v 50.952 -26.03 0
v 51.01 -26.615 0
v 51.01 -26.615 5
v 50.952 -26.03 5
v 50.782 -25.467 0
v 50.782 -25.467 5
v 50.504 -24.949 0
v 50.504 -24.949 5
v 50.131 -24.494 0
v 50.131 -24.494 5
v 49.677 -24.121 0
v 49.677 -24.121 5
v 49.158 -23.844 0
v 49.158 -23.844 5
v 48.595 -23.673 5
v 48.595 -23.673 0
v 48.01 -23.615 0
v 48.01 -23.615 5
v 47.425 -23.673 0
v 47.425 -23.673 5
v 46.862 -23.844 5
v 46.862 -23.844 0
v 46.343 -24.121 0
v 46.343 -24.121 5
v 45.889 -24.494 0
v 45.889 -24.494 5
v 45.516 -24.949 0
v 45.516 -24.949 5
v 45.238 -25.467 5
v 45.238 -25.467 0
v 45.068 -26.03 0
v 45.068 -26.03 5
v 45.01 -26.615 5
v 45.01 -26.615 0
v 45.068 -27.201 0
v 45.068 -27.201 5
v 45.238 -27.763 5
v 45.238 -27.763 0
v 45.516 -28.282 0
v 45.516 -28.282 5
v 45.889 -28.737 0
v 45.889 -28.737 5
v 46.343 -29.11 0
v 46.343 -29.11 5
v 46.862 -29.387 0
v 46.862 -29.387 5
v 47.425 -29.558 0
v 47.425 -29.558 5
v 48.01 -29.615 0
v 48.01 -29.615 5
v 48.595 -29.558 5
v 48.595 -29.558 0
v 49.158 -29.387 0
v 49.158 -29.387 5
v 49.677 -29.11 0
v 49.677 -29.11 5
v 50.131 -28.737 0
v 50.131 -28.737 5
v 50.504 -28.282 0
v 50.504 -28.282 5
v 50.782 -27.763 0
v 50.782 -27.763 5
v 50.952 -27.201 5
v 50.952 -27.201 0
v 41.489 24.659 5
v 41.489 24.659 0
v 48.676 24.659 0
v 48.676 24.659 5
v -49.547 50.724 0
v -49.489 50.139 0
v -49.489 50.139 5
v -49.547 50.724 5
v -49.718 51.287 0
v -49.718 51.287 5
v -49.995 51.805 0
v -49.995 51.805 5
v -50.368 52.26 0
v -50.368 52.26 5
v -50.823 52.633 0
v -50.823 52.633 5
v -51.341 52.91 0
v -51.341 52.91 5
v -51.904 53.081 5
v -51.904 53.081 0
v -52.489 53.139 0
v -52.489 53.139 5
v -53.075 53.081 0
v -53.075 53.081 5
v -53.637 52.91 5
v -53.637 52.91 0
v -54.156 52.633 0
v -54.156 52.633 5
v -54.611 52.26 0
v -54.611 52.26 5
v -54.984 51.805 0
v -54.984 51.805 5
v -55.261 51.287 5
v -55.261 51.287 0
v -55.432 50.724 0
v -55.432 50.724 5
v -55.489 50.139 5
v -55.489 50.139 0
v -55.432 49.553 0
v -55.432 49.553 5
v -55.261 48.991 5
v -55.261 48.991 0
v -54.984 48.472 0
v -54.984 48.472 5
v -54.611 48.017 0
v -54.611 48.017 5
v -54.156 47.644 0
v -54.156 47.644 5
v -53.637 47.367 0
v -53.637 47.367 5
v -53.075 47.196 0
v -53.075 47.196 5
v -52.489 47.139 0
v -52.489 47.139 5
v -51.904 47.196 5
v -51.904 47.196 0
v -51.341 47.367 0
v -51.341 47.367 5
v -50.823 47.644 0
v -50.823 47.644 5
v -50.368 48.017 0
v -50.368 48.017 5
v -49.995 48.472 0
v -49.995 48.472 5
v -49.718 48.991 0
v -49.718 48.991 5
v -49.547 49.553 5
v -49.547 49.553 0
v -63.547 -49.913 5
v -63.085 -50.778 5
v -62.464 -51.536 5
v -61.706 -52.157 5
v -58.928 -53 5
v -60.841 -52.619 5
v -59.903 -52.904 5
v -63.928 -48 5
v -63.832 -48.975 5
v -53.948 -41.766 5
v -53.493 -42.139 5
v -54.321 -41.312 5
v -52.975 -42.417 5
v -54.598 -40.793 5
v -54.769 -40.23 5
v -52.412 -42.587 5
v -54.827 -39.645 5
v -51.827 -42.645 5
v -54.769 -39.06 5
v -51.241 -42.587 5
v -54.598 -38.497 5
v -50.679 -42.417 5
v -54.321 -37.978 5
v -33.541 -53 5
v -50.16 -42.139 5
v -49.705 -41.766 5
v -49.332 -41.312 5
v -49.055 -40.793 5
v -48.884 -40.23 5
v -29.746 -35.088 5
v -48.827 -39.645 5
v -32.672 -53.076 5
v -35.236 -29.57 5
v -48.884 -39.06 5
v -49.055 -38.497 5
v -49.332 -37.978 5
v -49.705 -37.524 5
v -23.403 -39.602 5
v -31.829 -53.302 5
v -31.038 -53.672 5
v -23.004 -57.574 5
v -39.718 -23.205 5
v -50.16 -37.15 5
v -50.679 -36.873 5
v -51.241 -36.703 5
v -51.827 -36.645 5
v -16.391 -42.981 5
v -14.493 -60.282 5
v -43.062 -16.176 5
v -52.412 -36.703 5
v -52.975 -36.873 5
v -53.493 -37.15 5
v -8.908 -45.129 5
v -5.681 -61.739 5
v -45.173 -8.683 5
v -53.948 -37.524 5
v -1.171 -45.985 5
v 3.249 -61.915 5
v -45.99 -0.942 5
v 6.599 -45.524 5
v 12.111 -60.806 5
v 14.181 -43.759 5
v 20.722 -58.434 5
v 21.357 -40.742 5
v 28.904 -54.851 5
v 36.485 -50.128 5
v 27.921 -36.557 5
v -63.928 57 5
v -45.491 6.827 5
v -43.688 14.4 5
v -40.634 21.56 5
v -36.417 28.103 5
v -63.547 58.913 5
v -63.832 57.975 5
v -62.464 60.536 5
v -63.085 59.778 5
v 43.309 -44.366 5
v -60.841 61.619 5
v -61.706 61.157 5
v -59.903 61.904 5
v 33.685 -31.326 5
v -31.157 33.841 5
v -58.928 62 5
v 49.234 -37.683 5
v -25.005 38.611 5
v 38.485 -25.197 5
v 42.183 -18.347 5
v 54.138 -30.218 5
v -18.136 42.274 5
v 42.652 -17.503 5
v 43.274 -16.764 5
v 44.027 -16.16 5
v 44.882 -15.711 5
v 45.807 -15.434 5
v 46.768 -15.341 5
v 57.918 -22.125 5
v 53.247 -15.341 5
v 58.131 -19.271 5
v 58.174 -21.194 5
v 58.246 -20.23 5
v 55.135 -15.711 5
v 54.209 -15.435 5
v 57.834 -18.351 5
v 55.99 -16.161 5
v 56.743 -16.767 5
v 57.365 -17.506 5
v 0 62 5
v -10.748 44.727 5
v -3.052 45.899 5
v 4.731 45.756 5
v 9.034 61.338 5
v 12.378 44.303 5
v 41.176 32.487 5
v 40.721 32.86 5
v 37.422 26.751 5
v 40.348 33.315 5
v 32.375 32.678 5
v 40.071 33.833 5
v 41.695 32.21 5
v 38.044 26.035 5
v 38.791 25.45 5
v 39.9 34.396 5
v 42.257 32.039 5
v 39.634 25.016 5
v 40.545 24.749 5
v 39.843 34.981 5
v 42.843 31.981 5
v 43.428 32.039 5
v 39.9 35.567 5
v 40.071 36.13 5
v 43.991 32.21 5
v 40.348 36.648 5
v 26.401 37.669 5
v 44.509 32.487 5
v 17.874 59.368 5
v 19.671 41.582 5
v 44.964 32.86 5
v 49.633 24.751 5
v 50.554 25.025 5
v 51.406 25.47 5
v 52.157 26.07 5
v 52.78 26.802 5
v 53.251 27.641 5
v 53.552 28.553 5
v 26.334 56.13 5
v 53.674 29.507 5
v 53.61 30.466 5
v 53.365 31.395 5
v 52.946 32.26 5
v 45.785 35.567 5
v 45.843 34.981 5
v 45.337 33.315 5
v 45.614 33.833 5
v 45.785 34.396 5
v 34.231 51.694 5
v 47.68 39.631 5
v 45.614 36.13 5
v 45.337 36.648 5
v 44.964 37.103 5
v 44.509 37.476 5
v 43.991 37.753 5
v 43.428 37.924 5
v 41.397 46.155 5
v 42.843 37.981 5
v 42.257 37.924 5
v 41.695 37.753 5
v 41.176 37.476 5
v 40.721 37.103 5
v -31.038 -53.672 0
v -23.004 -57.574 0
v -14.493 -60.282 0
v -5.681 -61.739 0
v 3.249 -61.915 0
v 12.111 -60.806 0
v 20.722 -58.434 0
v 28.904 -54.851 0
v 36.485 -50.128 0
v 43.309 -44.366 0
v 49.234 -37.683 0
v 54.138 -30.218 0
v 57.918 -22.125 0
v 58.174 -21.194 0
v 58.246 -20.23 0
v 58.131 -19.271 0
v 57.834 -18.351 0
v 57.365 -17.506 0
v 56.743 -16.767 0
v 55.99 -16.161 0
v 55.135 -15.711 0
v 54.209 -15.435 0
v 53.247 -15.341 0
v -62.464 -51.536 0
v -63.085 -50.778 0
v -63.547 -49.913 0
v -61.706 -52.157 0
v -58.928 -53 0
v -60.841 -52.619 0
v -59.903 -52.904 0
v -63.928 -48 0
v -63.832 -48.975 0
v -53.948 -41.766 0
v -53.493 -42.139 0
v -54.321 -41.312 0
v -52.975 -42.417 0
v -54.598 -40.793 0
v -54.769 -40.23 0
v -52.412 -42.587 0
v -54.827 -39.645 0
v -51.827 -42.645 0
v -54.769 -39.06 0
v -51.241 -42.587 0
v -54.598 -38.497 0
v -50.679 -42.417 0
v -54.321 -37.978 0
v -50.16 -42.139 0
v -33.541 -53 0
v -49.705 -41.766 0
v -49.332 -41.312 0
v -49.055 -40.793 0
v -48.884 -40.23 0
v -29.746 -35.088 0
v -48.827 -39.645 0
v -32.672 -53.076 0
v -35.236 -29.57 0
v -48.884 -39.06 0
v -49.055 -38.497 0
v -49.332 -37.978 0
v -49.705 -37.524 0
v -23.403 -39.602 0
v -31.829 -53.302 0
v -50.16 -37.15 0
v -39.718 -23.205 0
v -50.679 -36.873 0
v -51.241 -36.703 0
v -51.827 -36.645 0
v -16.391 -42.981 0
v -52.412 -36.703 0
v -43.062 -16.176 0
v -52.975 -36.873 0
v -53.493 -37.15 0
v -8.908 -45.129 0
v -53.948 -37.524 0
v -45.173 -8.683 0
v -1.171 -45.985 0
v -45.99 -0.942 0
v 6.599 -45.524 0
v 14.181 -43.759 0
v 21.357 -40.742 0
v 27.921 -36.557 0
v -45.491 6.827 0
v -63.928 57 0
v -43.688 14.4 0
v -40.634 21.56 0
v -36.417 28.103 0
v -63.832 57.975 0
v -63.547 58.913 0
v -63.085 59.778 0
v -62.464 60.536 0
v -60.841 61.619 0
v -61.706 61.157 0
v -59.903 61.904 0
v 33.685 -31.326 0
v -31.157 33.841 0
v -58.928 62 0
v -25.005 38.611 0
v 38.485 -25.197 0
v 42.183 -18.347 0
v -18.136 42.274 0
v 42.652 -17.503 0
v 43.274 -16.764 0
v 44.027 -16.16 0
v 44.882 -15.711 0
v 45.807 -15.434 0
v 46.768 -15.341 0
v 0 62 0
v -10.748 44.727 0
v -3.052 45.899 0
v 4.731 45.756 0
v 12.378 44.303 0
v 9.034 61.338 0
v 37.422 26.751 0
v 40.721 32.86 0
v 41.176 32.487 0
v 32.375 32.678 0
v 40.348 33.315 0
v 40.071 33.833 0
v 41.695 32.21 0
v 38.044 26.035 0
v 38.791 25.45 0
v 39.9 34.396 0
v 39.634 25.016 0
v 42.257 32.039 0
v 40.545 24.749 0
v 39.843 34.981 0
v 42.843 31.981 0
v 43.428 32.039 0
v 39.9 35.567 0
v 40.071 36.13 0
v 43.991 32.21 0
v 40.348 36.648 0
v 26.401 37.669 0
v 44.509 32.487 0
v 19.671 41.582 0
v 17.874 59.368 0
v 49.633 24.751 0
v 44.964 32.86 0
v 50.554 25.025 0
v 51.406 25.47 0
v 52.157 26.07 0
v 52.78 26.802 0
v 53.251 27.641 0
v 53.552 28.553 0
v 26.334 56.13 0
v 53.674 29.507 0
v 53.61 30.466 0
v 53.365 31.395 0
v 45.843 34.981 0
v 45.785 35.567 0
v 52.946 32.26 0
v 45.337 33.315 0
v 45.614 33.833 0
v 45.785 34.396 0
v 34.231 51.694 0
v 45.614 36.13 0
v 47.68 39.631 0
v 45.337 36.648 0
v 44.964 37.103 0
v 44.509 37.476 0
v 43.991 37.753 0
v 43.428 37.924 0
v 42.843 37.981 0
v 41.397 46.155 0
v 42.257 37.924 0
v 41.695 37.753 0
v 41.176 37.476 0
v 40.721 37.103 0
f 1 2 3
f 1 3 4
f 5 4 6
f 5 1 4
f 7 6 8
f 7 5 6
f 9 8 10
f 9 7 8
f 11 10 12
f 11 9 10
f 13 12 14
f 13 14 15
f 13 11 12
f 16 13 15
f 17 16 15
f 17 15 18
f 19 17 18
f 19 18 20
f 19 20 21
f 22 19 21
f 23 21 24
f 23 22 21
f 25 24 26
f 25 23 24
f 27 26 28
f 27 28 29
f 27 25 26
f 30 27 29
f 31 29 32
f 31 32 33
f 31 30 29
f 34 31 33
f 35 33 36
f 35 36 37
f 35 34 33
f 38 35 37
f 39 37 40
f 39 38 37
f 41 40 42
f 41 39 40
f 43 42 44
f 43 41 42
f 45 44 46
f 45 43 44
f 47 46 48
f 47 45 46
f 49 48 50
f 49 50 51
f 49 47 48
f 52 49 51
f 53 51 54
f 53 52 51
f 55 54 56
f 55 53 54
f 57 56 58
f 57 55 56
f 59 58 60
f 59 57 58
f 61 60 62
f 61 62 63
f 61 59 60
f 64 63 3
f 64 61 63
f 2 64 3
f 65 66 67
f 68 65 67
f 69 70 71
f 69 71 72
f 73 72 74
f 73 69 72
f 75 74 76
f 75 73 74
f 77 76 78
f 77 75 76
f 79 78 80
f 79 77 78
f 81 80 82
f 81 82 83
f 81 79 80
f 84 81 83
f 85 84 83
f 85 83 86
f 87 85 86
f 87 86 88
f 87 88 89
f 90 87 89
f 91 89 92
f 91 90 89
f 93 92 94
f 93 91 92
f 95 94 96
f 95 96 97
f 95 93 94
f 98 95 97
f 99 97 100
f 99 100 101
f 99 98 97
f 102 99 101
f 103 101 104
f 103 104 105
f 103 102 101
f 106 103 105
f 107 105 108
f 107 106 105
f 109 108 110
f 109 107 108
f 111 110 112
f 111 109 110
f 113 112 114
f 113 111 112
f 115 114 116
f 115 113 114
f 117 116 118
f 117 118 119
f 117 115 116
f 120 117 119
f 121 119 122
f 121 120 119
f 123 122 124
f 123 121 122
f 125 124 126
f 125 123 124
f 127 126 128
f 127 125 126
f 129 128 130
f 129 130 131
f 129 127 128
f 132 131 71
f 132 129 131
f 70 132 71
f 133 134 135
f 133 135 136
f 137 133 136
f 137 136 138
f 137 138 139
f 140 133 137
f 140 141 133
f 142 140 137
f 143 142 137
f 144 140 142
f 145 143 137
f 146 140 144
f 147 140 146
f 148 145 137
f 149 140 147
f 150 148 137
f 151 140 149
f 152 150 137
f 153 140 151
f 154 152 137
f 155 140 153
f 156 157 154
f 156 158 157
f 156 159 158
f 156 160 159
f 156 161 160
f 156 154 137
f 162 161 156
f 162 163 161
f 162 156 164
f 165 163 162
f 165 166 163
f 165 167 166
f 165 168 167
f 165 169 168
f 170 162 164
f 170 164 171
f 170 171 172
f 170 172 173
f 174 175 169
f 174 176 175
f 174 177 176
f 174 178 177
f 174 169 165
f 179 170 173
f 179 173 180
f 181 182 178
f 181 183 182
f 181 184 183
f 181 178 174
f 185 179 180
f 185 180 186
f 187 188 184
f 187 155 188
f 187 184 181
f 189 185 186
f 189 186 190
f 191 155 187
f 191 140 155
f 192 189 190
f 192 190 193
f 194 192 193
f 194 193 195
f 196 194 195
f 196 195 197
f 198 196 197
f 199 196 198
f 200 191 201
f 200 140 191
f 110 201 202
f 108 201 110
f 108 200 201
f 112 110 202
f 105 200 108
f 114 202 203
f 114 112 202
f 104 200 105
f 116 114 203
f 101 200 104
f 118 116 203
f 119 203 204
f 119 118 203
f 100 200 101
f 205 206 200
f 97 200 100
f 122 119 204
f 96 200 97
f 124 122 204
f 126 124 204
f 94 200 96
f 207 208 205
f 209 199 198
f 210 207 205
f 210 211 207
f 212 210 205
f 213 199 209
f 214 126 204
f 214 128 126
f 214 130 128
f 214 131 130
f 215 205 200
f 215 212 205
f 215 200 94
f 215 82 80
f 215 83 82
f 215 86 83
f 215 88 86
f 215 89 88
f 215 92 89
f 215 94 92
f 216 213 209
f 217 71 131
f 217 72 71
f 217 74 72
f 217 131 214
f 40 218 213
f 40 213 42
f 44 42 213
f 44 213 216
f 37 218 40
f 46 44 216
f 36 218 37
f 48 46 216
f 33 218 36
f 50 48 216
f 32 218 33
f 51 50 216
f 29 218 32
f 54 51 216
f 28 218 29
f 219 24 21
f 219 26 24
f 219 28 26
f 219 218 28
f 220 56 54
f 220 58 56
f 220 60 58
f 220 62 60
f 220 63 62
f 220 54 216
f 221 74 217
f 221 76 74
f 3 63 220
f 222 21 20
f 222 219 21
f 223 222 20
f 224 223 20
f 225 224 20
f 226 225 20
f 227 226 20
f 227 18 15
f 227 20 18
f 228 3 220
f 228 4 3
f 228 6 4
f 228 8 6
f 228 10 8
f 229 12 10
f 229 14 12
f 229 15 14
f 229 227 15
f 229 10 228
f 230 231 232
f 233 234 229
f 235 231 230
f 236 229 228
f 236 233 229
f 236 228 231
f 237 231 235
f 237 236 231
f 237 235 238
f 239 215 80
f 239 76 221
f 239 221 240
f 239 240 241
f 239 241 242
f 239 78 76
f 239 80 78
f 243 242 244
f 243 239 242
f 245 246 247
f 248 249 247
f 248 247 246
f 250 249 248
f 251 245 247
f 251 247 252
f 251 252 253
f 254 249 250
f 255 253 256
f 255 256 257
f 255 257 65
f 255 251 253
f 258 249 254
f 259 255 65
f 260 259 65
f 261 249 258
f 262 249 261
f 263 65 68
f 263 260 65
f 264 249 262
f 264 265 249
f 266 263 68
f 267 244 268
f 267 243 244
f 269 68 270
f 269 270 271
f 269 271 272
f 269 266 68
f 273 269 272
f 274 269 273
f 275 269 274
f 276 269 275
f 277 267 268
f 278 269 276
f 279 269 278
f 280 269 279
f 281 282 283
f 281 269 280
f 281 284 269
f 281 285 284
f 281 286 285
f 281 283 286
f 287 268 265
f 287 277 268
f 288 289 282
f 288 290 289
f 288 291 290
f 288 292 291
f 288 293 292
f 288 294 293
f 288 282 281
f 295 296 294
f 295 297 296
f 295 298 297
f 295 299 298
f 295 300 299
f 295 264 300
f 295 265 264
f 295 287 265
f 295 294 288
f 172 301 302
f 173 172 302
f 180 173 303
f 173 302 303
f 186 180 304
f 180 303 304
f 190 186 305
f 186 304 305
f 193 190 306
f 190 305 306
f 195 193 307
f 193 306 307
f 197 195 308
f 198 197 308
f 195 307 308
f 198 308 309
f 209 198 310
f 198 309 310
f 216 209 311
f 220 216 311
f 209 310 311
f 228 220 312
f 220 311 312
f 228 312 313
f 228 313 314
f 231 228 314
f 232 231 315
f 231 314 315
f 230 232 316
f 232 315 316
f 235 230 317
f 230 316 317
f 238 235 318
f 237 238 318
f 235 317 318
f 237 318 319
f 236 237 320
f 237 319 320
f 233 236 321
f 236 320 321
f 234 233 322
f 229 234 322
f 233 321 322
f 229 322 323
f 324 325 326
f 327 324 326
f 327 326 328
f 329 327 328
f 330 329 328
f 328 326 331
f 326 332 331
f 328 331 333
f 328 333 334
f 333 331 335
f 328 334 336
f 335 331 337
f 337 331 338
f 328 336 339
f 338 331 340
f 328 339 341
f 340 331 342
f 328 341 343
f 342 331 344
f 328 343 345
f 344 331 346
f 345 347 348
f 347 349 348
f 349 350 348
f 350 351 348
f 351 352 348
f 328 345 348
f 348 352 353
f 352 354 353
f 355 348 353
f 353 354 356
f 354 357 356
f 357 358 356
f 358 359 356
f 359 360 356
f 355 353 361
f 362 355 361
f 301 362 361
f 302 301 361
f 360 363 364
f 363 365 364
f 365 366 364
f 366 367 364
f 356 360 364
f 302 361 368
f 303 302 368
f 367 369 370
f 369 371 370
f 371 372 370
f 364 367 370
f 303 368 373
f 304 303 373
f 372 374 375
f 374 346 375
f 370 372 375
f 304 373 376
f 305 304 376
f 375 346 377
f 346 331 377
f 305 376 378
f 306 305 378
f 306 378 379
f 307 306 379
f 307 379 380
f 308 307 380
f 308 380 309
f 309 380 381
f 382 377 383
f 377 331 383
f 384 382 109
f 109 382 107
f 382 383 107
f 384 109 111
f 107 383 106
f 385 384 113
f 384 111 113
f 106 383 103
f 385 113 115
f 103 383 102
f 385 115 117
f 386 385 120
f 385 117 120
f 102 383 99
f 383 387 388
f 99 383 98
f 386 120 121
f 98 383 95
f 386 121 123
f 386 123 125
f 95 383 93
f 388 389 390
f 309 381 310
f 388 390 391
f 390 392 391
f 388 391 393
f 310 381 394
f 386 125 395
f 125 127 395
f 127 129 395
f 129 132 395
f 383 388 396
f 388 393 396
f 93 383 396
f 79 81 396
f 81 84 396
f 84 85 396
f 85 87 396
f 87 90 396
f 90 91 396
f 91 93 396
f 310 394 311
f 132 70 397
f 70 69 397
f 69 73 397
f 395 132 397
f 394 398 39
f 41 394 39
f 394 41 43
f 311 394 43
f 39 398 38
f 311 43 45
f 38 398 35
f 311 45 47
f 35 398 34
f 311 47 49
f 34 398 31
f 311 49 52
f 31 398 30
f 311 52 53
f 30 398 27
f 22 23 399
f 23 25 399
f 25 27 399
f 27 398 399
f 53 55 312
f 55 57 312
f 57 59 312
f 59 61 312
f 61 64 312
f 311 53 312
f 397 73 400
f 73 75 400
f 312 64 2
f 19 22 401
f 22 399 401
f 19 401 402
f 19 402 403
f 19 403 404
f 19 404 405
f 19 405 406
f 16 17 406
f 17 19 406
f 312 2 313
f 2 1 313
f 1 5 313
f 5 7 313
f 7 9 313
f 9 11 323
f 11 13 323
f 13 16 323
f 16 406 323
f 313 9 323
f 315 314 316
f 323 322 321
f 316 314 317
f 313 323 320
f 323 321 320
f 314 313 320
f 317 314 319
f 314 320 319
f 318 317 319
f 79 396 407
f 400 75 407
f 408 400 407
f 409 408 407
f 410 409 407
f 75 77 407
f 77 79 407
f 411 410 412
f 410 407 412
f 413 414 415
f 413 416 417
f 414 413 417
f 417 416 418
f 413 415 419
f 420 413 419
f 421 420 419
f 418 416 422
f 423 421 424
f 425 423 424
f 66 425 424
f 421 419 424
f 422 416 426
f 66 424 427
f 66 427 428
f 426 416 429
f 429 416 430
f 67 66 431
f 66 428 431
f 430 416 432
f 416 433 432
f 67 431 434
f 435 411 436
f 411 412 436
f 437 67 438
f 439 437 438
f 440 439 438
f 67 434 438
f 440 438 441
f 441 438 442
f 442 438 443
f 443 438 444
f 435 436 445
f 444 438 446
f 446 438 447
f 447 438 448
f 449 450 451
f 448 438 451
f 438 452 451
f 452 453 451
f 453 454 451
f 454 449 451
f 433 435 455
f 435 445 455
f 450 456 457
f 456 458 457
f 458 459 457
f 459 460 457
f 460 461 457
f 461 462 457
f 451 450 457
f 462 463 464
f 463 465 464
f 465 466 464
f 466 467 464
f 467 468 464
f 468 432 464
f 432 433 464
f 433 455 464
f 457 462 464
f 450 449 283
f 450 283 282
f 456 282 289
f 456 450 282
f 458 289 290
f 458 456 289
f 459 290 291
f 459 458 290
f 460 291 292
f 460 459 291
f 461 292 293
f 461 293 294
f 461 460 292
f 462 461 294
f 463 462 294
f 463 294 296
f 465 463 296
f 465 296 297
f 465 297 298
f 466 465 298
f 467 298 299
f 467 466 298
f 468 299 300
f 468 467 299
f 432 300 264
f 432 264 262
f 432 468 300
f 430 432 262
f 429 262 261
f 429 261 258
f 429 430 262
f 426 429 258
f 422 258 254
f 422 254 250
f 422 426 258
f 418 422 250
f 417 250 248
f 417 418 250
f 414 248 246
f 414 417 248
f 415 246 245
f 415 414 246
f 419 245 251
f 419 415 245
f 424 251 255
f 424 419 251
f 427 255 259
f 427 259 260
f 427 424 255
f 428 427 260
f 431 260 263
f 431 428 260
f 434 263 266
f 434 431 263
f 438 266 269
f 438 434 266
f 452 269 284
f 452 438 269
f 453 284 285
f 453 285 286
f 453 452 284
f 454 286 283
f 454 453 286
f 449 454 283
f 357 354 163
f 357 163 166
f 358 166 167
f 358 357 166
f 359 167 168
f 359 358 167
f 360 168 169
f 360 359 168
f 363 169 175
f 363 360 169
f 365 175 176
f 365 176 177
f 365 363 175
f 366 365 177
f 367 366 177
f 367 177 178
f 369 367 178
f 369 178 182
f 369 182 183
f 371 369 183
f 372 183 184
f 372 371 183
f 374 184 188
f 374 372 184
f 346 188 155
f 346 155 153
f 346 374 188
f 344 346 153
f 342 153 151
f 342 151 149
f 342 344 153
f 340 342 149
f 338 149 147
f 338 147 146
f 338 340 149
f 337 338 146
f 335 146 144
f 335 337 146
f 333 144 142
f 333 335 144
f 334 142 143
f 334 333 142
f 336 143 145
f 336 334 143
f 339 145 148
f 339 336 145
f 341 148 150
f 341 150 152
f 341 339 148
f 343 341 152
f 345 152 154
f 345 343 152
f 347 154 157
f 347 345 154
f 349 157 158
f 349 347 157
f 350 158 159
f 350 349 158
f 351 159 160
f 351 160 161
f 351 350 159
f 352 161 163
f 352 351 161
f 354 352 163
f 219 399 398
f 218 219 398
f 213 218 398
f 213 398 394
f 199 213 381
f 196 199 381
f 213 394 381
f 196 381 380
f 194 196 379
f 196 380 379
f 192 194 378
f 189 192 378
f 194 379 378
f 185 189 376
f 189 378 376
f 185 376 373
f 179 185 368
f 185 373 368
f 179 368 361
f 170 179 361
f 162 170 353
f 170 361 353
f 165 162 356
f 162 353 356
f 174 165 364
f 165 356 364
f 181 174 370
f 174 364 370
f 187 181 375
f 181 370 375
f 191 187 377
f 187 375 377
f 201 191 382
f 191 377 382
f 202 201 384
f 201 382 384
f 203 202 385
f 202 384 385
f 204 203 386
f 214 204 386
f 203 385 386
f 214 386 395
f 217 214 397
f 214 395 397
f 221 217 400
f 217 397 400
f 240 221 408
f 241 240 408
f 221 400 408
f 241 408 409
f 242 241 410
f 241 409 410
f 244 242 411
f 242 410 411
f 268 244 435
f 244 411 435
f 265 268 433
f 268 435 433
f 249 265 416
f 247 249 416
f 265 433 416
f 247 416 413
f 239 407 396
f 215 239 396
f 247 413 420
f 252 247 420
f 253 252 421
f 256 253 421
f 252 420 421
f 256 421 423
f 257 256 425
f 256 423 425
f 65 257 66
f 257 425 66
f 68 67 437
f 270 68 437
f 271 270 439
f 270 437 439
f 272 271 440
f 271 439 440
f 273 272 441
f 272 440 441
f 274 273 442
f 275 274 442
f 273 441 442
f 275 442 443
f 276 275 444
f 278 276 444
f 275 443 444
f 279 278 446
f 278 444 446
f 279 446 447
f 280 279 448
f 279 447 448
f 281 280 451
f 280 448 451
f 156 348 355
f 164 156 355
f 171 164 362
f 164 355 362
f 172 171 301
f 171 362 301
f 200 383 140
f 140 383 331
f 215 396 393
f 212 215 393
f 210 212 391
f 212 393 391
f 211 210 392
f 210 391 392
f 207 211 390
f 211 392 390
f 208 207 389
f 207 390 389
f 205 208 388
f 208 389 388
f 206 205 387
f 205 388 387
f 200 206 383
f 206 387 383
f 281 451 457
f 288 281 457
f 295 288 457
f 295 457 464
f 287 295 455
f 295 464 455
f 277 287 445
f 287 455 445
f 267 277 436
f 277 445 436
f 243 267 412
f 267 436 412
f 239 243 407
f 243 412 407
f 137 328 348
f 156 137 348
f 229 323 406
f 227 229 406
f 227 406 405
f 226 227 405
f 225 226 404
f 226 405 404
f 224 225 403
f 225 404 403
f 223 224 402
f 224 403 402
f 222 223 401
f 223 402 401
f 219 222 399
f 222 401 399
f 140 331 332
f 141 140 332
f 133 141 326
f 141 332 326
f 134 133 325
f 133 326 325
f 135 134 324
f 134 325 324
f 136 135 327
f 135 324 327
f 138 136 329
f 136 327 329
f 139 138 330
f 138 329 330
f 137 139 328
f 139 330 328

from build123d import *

# Parameters (mm, degrees)
F0_R     = 3
F1_DEPTH = 5


with BuildPart() as f1:
    # F0 (on Top) → F1 (new body)
    with BuildSketch(Plane.XY):
        with BuildLine():
            ThreePointArc((42.182817, -18.346934), (-45.745768, -4.82957), (37.42163, 26.751105))
            ThreePointArc((37.42163, 26.751105), (39.20213, 25.212564), (41.489198, 24.658834))
            Line((41.489198, 24.658834), (48.676006, 24.658834))
            ThreePointArc((48.676006, 24.658834), (53.035379, 27.210188), (52.945831, 32.260486))
            ThreePointArc((52.945831, 32.260486), (30.363217, 54.056221), (0, 62))
            Line((0, 62), (-58.927971, 62))
            ThreePointArc((-58.927971, 62), (-62.463505, 60.535534), (-63.927971, 57))
            Line((-63.927971, 57), (-63.927971, -48))
            ThreePointArc((-63.927971, -48), (-62.463505, -51.535534), (-58.927971, -53))
            Line((-58.927971, -53), (-33.54102, -53))
            ThreePointArc((-33.54102, -53), (-32.245217, -53.170829), (-31.037958, -53.671642))
            ThreePointArc((-31.037958, -53.671642), (20.722466, -58.434402), (57.917728, -22.125478))
            ThreePointArc((57.917728, -22.125478), (57.36529, -17.505814), (53.246943, -15.341166))
            Line((53.246943, -15.341166), (46.767905, -15.341166))
            ThreePointArc((46.767905, -15.341166), (44.026661, -16.159589), (42.182817, -18.346934))
        make_face()
        with Locations((-51.826652, -39.644886)):
            Circle(F0_R, mode=Mode.SUBTRACT)
        with Locations((48.010073, -26.615358)):
            Circle(F0_R, mode=Mode.SUBTRACT)
        with Locations((-52.489314, 50.138593)):
            Circle(F0_R, mode=Mode.SUBTRACT)
        with Locations((42.842665, 34.981498)):
            Circle(F0_R, mode=Mode.SUBTRACT)
    extrude(amount=F1_DEPTH)


solid = f1.part
